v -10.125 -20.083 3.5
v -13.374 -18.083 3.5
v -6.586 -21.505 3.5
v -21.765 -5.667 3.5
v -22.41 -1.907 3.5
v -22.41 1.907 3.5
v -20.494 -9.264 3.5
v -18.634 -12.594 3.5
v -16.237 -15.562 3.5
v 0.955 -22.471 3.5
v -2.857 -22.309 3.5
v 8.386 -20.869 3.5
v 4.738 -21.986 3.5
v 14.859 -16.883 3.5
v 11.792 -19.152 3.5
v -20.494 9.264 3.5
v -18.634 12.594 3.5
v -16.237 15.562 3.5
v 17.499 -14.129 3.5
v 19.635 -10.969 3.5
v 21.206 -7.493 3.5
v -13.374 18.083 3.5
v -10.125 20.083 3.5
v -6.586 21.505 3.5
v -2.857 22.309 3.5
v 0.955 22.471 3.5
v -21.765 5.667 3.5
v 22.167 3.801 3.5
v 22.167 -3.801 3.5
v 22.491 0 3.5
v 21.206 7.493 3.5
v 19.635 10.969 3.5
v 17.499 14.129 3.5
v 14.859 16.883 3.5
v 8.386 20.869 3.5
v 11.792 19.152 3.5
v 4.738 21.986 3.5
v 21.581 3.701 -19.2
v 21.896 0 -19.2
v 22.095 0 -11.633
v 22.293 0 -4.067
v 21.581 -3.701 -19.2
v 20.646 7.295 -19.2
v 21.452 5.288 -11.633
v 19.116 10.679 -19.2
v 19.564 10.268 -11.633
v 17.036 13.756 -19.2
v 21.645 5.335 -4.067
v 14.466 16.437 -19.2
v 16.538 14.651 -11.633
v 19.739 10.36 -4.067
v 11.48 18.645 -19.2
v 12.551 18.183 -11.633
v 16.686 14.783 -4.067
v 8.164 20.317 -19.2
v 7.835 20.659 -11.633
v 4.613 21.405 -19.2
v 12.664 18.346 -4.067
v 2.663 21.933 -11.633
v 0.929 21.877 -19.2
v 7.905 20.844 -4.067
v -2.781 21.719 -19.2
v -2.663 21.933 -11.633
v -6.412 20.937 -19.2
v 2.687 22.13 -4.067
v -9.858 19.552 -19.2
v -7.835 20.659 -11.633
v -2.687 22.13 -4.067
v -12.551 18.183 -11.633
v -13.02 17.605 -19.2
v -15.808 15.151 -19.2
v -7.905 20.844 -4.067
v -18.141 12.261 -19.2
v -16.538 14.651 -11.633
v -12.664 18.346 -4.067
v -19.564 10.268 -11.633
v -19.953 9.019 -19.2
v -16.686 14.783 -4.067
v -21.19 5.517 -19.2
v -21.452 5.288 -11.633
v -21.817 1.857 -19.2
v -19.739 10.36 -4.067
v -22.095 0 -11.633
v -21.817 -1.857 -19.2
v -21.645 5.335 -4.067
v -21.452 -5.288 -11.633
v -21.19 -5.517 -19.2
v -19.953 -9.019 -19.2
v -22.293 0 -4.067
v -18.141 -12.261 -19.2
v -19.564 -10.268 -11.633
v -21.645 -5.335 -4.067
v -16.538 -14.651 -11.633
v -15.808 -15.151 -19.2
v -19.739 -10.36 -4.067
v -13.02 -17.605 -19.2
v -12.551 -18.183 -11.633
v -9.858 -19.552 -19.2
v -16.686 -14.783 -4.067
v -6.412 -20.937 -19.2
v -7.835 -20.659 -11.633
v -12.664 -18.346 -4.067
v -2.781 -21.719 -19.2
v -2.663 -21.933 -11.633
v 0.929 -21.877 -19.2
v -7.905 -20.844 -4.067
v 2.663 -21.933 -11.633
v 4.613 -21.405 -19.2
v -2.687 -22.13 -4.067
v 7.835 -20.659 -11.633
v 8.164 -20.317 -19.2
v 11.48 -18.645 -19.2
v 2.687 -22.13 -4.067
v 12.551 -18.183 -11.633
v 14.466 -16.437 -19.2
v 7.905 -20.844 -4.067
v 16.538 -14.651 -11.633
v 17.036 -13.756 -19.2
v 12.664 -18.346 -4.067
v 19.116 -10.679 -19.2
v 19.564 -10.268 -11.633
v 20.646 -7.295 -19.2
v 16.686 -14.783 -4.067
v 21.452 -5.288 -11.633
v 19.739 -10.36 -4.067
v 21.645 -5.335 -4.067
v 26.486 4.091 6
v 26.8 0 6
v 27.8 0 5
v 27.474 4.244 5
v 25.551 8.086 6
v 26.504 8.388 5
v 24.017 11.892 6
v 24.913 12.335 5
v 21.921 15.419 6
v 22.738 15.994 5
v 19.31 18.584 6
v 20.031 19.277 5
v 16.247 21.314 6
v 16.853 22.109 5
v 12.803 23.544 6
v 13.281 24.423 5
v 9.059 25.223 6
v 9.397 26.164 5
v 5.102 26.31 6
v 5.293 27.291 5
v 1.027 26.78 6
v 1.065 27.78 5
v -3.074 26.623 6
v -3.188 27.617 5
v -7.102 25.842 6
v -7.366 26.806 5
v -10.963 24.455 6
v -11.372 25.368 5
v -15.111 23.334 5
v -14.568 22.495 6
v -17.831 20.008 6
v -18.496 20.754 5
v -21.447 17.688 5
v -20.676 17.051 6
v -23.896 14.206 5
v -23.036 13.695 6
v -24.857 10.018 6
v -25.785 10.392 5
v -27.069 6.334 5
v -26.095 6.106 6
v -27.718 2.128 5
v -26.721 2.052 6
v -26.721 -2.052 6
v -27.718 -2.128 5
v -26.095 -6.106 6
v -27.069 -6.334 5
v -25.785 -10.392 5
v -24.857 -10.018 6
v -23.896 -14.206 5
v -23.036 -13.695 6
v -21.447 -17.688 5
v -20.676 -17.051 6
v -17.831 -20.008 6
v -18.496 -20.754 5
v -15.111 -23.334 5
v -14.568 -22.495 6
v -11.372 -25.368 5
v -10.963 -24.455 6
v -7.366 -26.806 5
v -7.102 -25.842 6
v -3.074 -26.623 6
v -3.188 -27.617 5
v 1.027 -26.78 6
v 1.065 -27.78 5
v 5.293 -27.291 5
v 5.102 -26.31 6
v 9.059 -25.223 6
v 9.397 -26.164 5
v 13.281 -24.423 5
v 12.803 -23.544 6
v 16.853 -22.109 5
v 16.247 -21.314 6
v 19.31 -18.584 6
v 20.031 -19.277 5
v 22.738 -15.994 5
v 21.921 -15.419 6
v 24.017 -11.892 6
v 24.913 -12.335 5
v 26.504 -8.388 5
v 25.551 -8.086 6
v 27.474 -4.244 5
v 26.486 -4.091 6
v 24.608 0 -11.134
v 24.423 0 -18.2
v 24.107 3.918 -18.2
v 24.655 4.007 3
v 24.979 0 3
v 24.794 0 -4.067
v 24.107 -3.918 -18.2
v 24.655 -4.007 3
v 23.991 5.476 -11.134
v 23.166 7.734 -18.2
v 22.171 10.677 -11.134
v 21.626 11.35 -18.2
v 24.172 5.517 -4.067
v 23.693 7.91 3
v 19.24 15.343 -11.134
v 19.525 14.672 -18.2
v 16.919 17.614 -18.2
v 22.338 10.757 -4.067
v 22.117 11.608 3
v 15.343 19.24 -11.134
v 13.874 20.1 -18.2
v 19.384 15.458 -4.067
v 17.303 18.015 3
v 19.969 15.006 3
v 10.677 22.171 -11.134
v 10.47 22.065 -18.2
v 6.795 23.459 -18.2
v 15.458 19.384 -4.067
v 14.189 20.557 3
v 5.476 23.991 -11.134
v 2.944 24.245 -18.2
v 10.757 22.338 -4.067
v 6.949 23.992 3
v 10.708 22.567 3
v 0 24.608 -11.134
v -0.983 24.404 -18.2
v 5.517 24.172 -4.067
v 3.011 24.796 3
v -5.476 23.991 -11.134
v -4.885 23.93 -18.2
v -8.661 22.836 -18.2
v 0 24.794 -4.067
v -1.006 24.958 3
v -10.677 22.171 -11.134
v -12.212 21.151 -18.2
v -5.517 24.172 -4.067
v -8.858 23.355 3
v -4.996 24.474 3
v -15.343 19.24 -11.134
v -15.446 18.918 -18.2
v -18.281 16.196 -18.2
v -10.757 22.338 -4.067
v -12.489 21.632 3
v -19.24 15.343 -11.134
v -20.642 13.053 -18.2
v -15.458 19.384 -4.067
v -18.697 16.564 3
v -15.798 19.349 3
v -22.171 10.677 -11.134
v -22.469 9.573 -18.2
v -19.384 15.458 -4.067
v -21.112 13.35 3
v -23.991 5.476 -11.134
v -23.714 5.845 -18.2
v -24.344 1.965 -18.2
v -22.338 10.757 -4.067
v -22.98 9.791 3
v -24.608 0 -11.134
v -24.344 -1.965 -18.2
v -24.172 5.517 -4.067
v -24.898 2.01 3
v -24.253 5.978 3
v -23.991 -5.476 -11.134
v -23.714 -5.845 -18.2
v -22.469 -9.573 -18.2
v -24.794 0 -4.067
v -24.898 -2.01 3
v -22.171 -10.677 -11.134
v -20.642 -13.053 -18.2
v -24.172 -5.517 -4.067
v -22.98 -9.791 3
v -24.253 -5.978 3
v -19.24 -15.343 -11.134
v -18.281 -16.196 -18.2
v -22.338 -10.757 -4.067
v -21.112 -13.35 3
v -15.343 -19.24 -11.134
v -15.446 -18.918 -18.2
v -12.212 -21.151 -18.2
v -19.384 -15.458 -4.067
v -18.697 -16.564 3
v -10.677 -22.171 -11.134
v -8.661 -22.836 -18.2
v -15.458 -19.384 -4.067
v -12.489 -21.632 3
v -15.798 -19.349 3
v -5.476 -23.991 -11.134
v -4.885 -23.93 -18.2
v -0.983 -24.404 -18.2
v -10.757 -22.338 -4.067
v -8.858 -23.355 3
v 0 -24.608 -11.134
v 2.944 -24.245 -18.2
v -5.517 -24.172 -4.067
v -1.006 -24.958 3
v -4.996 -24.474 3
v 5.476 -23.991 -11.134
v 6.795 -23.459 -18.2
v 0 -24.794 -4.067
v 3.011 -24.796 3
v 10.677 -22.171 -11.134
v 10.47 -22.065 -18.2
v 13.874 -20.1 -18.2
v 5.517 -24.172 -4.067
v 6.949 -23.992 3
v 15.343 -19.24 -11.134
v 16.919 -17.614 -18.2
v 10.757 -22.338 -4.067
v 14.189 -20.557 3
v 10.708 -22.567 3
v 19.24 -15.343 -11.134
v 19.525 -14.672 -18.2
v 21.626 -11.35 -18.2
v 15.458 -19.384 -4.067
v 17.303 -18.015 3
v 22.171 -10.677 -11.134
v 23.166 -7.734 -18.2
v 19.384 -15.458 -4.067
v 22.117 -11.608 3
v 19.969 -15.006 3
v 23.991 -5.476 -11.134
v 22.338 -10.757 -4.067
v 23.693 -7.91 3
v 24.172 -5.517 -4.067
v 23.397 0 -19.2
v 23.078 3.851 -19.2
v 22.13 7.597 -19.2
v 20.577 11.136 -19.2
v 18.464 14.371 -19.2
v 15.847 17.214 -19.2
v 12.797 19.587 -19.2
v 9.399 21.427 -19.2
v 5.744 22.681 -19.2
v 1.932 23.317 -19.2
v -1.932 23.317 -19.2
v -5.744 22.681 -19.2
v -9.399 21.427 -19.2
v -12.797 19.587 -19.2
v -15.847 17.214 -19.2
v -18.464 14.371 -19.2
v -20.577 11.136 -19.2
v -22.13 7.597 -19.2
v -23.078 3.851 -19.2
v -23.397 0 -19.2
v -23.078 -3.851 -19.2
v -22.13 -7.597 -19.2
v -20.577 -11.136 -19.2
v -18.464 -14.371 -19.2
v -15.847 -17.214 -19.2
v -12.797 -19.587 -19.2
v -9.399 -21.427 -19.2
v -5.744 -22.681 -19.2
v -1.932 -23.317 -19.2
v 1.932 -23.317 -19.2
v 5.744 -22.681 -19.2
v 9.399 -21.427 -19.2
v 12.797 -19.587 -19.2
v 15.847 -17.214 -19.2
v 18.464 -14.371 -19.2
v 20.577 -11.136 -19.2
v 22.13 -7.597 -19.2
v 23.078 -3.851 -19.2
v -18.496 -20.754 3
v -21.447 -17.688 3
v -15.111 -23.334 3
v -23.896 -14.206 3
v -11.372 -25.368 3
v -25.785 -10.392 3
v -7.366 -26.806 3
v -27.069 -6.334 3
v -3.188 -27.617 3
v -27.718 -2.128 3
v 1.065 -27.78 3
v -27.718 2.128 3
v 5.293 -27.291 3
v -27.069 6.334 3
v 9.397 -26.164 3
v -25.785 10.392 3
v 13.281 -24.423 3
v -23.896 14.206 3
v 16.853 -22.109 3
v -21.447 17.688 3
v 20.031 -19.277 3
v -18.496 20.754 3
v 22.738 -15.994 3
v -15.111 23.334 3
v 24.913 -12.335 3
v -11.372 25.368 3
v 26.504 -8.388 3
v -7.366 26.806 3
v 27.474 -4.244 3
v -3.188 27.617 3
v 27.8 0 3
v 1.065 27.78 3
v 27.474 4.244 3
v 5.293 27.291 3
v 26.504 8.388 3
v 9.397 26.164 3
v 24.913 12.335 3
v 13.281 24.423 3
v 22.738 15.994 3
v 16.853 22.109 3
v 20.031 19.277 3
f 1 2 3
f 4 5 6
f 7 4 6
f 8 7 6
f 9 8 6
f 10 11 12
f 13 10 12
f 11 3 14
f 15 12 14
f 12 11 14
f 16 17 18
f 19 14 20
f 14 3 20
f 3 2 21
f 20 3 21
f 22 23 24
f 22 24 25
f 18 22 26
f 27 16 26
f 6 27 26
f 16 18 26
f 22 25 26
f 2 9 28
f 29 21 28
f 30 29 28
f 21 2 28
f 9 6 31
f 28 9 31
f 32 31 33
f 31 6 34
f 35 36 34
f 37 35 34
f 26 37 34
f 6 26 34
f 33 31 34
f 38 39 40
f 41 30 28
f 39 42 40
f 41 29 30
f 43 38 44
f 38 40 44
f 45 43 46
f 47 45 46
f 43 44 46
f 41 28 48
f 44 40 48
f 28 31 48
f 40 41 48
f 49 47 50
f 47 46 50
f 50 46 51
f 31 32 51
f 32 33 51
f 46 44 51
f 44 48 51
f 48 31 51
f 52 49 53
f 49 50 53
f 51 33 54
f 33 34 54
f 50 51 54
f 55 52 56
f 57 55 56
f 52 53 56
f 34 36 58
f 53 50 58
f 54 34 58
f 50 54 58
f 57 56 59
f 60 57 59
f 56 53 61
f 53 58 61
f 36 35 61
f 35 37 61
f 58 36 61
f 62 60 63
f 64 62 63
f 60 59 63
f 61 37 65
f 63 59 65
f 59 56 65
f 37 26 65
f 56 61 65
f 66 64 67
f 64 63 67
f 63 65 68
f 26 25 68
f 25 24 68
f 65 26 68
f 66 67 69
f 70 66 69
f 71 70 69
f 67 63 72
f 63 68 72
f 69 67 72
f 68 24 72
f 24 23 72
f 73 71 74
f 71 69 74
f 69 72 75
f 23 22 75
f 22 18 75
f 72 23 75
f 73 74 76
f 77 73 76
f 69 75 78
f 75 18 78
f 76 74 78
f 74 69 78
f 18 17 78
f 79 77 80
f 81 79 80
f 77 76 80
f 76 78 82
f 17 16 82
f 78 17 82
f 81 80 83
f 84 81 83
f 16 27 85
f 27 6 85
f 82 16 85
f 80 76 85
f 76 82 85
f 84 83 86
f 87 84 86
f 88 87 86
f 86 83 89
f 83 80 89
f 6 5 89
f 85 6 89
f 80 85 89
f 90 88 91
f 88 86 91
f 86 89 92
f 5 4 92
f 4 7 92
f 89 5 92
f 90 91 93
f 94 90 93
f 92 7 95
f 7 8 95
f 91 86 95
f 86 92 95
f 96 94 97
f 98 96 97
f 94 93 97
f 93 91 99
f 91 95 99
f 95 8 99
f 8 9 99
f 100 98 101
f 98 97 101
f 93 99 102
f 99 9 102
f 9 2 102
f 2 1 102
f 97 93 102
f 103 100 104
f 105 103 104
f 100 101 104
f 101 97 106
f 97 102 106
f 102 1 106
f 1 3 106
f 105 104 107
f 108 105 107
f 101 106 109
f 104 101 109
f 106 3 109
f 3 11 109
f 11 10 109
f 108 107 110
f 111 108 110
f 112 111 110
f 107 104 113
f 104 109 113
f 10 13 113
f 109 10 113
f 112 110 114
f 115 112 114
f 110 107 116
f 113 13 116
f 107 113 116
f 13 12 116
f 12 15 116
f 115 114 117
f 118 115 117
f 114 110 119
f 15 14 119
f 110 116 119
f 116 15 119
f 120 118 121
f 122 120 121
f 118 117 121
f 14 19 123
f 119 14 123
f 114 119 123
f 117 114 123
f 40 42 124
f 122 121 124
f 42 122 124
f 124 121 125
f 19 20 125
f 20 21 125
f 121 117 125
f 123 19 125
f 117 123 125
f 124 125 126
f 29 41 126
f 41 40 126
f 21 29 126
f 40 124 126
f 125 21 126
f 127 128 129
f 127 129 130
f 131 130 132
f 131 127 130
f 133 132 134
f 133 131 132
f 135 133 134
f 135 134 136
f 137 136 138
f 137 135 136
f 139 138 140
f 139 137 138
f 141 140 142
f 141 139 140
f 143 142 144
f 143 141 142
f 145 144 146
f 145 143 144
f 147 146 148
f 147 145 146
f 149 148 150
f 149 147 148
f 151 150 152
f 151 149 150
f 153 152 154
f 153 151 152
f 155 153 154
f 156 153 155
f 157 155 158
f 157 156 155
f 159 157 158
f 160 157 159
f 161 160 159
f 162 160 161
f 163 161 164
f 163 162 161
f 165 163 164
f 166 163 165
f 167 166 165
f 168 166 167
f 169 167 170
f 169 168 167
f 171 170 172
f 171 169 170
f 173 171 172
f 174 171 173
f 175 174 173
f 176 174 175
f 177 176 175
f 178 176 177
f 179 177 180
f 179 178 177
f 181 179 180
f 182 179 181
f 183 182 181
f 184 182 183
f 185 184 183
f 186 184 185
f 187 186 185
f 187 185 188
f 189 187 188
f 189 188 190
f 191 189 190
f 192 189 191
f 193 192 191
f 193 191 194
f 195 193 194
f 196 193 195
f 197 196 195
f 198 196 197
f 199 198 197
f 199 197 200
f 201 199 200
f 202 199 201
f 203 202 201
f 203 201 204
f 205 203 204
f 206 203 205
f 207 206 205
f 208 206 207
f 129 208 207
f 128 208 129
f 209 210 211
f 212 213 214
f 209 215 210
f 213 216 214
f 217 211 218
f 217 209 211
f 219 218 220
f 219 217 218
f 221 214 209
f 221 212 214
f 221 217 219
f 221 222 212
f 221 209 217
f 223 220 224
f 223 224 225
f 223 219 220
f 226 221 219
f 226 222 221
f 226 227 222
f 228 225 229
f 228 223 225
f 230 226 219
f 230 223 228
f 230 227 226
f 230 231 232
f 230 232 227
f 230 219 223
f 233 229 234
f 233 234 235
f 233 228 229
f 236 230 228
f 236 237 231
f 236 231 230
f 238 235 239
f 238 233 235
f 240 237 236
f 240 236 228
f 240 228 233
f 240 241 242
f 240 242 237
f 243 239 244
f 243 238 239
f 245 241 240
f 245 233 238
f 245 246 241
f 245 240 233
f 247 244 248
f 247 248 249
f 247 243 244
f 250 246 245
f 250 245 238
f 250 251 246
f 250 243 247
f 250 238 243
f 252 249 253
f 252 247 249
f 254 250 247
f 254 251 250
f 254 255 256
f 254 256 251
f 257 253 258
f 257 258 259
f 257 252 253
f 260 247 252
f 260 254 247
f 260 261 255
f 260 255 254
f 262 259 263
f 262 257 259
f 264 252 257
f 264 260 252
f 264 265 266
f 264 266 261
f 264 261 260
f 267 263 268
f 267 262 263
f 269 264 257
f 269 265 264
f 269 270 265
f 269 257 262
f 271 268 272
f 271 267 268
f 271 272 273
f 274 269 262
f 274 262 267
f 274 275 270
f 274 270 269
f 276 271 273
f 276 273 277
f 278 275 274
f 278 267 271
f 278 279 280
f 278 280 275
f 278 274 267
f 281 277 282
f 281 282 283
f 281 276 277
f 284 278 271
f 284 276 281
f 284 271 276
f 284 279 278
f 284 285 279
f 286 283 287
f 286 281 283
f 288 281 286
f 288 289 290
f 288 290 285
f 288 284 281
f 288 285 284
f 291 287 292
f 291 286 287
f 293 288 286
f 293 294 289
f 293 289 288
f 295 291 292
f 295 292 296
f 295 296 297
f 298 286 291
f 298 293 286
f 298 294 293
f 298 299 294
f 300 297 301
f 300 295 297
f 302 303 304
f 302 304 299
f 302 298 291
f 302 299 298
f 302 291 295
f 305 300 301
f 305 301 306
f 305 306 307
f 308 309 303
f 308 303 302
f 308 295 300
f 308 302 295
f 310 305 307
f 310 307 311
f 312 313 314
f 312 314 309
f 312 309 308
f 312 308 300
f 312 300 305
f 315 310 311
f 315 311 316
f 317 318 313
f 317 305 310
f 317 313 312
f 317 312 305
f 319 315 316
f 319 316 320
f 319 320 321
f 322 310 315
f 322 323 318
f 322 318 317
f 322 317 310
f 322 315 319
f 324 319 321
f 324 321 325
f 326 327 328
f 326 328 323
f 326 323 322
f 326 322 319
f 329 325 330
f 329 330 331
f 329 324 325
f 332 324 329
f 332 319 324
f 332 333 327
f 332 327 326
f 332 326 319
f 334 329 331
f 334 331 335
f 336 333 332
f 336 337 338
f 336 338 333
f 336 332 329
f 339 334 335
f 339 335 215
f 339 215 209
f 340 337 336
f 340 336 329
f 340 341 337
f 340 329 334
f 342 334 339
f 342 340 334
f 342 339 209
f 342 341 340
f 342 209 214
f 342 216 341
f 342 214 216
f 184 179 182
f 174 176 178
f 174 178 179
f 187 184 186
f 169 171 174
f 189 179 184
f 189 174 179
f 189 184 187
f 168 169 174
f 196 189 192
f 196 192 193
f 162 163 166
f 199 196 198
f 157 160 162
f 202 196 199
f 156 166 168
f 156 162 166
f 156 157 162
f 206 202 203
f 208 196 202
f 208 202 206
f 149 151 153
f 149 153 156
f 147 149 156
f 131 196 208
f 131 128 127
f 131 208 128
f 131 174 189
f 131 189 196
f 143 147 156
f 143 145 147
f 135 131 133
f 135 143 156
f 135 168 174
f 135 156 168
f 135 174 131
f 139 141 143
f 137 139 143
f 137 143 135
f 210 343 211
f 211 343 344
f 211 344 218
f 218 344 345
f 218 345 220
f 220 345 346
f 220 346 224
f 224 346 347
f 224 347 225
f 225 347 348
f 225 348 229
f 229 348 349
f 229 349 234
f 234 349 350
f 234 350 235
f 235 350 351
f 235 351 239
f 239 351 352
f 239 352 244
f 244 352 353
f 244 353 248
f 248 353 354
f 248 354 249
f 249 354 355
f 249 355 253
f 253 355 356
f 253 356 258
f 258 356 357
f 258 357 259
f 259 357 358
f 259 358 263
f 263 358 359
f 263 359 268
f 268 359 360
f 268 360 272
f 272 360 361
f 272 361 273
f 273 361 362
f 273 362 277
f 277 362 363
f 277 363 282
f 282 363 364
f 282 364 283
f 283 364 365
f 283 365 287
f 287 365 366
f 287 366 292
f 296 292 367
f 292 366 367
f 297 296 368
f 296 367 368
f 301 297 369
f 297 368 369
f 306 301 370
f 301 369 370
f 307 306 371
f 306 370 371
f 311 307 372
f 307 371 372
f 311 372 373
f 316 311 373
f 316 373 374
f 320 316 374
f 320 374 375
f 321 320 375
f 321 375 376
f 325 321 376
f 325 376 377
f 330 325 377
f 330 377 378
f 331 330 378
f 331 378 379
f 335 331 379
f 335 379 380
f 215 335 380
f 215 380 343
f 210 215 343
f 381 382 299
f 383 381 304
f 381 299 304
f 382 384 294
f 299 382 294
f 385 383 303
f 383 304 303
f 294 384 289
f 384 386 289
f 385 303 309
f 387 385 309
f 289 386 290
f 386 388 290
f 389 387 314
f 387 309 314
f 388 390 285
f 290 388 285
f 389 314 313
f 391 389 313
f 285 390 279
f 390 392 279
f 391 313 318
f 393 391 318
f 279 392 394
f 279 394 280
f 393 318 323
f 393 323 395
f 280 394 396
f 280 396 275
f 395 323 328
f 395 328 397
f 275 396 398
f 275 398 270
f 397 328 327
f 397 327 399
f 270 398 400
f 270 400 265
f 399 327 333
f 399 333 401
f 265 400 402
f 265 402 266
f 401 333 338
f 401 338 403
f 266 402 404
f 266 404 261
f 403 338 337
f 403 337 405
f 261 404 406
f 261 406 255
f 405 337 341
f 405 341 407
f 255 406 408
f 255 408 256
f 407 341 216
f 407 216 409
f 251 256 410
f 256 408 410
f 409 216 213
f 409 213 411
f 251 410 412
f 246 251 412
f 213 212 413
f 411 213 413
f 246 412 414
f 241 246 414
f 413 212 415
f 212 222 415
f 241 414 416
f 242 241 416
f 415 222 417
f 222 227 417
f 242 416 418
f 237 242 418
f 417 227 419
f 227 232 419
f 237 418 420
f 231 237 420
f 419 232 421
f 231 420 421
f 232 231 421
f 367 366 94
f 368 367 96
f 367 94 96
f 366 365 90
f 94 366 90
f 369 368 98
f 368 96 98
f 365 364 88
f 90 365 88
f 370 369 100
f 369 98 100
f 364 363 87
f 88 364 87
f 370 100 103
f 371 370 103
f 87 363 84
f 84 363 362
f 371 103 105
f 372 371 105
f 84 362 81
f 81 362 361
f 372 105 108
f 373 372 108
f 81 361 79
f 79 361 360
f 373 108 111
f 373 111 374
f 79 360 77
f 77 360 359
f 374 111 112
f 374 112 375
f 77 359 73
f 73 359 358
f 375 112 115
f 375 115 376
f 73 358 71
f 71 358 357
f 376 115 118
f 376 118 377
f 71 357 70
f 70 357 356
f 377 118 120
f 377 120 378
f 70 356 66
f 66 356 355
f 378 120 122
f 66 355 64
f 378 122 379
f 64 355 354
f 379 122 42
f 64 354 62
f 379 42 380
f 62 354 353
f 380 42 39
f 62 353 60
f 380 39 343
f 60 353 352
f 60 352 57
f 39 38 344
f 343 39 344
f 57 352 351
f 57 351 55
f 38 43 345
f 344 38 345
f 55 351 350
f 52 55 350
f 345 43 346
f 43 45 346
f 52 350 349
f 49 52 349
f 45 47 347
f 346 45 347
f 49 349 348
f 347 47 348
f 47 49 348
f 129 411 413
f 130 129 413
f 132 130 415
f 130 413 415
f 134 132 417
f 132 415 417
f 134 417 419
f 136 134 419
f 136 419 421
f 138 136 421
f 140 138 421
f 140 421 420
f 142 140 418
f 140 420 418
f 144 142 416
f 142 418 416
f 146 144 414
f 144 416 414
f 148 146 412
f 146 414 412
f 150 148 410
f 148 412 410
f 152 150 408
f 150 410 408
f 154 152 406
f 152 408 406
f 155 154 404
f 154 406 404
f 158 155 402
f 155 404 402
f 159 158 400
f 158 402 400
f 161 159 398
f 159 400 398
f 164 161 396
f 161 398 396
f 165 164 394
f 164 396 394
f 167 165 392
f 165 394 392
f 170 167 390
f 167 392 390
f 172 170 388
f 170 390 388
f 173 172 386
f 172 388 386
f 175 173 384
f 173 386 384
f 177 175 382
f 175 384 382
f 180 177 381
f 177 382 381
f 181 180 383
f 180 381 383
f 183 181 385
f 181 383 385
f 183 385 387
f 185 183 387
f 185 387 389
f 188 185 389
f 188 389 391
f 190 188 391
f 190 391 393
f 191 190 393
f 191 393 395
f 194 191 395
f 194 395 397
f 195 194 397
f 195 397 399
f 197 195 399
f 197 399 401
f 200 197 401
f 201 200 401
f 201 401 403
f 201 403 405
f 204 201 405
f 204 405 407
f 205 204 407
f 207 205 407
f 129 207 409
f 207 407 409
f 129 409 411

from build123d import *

# Parameters (mm, degrees)
F0_R          = 24.9
F1_DEPTH      = 19.2
F1_TAPER      = 1.5
F1_DEPTH_BACK = 3
F1_TAPER_BACK = -1.5
F2_R          = 27.8
F3_DEPTH      = 3
F4_SIZE       = 1
F5_T          = -2.5
F6_SIZE       = 1


with BuildPart() as f1:
    # F0 (on Top) → F1 (new body, two sides)
    with BuildSketch(Plane.XY) as f1_sk:
        Circle(F0_R)
    extrude(amount=-F1_DEPTH, taper=F1_TAPER)
    extrude(f1_sk.sketch, amount=F1_DEPTH_BACK, taper=F1_TAPER_BACK)

    # F2 (on face) → F3 (join)
    with BuildSketch(Plane.XY.offset(3)):
        Circle(F2_R)
    extrude(amount=F3_DEPTH)

    # F4
    f4_edges = [f1.edges().sort_by_distance(p)[0] for p in [
        (-27.8, 0, 6),
    ]]
    chamfer(f4_edges, length=F4_SIZE)

    # F5
    f5_openings = [f1.faces().sort_by_distance(p)[0] for p in [
        (0, 0, -19.2),
    ]]
    offset(amount=F5_T, openings=f5_openings, kind=Kind.INTERSECTION)

    # F6
    f6_edges = [f1.edges().sort_by_distance(p)[0] for p in [
        (-24.39723, 0, -19.2),
    ]]
    chamfer(f6_edges, length=F6_SIZE)


solid = f1.part
